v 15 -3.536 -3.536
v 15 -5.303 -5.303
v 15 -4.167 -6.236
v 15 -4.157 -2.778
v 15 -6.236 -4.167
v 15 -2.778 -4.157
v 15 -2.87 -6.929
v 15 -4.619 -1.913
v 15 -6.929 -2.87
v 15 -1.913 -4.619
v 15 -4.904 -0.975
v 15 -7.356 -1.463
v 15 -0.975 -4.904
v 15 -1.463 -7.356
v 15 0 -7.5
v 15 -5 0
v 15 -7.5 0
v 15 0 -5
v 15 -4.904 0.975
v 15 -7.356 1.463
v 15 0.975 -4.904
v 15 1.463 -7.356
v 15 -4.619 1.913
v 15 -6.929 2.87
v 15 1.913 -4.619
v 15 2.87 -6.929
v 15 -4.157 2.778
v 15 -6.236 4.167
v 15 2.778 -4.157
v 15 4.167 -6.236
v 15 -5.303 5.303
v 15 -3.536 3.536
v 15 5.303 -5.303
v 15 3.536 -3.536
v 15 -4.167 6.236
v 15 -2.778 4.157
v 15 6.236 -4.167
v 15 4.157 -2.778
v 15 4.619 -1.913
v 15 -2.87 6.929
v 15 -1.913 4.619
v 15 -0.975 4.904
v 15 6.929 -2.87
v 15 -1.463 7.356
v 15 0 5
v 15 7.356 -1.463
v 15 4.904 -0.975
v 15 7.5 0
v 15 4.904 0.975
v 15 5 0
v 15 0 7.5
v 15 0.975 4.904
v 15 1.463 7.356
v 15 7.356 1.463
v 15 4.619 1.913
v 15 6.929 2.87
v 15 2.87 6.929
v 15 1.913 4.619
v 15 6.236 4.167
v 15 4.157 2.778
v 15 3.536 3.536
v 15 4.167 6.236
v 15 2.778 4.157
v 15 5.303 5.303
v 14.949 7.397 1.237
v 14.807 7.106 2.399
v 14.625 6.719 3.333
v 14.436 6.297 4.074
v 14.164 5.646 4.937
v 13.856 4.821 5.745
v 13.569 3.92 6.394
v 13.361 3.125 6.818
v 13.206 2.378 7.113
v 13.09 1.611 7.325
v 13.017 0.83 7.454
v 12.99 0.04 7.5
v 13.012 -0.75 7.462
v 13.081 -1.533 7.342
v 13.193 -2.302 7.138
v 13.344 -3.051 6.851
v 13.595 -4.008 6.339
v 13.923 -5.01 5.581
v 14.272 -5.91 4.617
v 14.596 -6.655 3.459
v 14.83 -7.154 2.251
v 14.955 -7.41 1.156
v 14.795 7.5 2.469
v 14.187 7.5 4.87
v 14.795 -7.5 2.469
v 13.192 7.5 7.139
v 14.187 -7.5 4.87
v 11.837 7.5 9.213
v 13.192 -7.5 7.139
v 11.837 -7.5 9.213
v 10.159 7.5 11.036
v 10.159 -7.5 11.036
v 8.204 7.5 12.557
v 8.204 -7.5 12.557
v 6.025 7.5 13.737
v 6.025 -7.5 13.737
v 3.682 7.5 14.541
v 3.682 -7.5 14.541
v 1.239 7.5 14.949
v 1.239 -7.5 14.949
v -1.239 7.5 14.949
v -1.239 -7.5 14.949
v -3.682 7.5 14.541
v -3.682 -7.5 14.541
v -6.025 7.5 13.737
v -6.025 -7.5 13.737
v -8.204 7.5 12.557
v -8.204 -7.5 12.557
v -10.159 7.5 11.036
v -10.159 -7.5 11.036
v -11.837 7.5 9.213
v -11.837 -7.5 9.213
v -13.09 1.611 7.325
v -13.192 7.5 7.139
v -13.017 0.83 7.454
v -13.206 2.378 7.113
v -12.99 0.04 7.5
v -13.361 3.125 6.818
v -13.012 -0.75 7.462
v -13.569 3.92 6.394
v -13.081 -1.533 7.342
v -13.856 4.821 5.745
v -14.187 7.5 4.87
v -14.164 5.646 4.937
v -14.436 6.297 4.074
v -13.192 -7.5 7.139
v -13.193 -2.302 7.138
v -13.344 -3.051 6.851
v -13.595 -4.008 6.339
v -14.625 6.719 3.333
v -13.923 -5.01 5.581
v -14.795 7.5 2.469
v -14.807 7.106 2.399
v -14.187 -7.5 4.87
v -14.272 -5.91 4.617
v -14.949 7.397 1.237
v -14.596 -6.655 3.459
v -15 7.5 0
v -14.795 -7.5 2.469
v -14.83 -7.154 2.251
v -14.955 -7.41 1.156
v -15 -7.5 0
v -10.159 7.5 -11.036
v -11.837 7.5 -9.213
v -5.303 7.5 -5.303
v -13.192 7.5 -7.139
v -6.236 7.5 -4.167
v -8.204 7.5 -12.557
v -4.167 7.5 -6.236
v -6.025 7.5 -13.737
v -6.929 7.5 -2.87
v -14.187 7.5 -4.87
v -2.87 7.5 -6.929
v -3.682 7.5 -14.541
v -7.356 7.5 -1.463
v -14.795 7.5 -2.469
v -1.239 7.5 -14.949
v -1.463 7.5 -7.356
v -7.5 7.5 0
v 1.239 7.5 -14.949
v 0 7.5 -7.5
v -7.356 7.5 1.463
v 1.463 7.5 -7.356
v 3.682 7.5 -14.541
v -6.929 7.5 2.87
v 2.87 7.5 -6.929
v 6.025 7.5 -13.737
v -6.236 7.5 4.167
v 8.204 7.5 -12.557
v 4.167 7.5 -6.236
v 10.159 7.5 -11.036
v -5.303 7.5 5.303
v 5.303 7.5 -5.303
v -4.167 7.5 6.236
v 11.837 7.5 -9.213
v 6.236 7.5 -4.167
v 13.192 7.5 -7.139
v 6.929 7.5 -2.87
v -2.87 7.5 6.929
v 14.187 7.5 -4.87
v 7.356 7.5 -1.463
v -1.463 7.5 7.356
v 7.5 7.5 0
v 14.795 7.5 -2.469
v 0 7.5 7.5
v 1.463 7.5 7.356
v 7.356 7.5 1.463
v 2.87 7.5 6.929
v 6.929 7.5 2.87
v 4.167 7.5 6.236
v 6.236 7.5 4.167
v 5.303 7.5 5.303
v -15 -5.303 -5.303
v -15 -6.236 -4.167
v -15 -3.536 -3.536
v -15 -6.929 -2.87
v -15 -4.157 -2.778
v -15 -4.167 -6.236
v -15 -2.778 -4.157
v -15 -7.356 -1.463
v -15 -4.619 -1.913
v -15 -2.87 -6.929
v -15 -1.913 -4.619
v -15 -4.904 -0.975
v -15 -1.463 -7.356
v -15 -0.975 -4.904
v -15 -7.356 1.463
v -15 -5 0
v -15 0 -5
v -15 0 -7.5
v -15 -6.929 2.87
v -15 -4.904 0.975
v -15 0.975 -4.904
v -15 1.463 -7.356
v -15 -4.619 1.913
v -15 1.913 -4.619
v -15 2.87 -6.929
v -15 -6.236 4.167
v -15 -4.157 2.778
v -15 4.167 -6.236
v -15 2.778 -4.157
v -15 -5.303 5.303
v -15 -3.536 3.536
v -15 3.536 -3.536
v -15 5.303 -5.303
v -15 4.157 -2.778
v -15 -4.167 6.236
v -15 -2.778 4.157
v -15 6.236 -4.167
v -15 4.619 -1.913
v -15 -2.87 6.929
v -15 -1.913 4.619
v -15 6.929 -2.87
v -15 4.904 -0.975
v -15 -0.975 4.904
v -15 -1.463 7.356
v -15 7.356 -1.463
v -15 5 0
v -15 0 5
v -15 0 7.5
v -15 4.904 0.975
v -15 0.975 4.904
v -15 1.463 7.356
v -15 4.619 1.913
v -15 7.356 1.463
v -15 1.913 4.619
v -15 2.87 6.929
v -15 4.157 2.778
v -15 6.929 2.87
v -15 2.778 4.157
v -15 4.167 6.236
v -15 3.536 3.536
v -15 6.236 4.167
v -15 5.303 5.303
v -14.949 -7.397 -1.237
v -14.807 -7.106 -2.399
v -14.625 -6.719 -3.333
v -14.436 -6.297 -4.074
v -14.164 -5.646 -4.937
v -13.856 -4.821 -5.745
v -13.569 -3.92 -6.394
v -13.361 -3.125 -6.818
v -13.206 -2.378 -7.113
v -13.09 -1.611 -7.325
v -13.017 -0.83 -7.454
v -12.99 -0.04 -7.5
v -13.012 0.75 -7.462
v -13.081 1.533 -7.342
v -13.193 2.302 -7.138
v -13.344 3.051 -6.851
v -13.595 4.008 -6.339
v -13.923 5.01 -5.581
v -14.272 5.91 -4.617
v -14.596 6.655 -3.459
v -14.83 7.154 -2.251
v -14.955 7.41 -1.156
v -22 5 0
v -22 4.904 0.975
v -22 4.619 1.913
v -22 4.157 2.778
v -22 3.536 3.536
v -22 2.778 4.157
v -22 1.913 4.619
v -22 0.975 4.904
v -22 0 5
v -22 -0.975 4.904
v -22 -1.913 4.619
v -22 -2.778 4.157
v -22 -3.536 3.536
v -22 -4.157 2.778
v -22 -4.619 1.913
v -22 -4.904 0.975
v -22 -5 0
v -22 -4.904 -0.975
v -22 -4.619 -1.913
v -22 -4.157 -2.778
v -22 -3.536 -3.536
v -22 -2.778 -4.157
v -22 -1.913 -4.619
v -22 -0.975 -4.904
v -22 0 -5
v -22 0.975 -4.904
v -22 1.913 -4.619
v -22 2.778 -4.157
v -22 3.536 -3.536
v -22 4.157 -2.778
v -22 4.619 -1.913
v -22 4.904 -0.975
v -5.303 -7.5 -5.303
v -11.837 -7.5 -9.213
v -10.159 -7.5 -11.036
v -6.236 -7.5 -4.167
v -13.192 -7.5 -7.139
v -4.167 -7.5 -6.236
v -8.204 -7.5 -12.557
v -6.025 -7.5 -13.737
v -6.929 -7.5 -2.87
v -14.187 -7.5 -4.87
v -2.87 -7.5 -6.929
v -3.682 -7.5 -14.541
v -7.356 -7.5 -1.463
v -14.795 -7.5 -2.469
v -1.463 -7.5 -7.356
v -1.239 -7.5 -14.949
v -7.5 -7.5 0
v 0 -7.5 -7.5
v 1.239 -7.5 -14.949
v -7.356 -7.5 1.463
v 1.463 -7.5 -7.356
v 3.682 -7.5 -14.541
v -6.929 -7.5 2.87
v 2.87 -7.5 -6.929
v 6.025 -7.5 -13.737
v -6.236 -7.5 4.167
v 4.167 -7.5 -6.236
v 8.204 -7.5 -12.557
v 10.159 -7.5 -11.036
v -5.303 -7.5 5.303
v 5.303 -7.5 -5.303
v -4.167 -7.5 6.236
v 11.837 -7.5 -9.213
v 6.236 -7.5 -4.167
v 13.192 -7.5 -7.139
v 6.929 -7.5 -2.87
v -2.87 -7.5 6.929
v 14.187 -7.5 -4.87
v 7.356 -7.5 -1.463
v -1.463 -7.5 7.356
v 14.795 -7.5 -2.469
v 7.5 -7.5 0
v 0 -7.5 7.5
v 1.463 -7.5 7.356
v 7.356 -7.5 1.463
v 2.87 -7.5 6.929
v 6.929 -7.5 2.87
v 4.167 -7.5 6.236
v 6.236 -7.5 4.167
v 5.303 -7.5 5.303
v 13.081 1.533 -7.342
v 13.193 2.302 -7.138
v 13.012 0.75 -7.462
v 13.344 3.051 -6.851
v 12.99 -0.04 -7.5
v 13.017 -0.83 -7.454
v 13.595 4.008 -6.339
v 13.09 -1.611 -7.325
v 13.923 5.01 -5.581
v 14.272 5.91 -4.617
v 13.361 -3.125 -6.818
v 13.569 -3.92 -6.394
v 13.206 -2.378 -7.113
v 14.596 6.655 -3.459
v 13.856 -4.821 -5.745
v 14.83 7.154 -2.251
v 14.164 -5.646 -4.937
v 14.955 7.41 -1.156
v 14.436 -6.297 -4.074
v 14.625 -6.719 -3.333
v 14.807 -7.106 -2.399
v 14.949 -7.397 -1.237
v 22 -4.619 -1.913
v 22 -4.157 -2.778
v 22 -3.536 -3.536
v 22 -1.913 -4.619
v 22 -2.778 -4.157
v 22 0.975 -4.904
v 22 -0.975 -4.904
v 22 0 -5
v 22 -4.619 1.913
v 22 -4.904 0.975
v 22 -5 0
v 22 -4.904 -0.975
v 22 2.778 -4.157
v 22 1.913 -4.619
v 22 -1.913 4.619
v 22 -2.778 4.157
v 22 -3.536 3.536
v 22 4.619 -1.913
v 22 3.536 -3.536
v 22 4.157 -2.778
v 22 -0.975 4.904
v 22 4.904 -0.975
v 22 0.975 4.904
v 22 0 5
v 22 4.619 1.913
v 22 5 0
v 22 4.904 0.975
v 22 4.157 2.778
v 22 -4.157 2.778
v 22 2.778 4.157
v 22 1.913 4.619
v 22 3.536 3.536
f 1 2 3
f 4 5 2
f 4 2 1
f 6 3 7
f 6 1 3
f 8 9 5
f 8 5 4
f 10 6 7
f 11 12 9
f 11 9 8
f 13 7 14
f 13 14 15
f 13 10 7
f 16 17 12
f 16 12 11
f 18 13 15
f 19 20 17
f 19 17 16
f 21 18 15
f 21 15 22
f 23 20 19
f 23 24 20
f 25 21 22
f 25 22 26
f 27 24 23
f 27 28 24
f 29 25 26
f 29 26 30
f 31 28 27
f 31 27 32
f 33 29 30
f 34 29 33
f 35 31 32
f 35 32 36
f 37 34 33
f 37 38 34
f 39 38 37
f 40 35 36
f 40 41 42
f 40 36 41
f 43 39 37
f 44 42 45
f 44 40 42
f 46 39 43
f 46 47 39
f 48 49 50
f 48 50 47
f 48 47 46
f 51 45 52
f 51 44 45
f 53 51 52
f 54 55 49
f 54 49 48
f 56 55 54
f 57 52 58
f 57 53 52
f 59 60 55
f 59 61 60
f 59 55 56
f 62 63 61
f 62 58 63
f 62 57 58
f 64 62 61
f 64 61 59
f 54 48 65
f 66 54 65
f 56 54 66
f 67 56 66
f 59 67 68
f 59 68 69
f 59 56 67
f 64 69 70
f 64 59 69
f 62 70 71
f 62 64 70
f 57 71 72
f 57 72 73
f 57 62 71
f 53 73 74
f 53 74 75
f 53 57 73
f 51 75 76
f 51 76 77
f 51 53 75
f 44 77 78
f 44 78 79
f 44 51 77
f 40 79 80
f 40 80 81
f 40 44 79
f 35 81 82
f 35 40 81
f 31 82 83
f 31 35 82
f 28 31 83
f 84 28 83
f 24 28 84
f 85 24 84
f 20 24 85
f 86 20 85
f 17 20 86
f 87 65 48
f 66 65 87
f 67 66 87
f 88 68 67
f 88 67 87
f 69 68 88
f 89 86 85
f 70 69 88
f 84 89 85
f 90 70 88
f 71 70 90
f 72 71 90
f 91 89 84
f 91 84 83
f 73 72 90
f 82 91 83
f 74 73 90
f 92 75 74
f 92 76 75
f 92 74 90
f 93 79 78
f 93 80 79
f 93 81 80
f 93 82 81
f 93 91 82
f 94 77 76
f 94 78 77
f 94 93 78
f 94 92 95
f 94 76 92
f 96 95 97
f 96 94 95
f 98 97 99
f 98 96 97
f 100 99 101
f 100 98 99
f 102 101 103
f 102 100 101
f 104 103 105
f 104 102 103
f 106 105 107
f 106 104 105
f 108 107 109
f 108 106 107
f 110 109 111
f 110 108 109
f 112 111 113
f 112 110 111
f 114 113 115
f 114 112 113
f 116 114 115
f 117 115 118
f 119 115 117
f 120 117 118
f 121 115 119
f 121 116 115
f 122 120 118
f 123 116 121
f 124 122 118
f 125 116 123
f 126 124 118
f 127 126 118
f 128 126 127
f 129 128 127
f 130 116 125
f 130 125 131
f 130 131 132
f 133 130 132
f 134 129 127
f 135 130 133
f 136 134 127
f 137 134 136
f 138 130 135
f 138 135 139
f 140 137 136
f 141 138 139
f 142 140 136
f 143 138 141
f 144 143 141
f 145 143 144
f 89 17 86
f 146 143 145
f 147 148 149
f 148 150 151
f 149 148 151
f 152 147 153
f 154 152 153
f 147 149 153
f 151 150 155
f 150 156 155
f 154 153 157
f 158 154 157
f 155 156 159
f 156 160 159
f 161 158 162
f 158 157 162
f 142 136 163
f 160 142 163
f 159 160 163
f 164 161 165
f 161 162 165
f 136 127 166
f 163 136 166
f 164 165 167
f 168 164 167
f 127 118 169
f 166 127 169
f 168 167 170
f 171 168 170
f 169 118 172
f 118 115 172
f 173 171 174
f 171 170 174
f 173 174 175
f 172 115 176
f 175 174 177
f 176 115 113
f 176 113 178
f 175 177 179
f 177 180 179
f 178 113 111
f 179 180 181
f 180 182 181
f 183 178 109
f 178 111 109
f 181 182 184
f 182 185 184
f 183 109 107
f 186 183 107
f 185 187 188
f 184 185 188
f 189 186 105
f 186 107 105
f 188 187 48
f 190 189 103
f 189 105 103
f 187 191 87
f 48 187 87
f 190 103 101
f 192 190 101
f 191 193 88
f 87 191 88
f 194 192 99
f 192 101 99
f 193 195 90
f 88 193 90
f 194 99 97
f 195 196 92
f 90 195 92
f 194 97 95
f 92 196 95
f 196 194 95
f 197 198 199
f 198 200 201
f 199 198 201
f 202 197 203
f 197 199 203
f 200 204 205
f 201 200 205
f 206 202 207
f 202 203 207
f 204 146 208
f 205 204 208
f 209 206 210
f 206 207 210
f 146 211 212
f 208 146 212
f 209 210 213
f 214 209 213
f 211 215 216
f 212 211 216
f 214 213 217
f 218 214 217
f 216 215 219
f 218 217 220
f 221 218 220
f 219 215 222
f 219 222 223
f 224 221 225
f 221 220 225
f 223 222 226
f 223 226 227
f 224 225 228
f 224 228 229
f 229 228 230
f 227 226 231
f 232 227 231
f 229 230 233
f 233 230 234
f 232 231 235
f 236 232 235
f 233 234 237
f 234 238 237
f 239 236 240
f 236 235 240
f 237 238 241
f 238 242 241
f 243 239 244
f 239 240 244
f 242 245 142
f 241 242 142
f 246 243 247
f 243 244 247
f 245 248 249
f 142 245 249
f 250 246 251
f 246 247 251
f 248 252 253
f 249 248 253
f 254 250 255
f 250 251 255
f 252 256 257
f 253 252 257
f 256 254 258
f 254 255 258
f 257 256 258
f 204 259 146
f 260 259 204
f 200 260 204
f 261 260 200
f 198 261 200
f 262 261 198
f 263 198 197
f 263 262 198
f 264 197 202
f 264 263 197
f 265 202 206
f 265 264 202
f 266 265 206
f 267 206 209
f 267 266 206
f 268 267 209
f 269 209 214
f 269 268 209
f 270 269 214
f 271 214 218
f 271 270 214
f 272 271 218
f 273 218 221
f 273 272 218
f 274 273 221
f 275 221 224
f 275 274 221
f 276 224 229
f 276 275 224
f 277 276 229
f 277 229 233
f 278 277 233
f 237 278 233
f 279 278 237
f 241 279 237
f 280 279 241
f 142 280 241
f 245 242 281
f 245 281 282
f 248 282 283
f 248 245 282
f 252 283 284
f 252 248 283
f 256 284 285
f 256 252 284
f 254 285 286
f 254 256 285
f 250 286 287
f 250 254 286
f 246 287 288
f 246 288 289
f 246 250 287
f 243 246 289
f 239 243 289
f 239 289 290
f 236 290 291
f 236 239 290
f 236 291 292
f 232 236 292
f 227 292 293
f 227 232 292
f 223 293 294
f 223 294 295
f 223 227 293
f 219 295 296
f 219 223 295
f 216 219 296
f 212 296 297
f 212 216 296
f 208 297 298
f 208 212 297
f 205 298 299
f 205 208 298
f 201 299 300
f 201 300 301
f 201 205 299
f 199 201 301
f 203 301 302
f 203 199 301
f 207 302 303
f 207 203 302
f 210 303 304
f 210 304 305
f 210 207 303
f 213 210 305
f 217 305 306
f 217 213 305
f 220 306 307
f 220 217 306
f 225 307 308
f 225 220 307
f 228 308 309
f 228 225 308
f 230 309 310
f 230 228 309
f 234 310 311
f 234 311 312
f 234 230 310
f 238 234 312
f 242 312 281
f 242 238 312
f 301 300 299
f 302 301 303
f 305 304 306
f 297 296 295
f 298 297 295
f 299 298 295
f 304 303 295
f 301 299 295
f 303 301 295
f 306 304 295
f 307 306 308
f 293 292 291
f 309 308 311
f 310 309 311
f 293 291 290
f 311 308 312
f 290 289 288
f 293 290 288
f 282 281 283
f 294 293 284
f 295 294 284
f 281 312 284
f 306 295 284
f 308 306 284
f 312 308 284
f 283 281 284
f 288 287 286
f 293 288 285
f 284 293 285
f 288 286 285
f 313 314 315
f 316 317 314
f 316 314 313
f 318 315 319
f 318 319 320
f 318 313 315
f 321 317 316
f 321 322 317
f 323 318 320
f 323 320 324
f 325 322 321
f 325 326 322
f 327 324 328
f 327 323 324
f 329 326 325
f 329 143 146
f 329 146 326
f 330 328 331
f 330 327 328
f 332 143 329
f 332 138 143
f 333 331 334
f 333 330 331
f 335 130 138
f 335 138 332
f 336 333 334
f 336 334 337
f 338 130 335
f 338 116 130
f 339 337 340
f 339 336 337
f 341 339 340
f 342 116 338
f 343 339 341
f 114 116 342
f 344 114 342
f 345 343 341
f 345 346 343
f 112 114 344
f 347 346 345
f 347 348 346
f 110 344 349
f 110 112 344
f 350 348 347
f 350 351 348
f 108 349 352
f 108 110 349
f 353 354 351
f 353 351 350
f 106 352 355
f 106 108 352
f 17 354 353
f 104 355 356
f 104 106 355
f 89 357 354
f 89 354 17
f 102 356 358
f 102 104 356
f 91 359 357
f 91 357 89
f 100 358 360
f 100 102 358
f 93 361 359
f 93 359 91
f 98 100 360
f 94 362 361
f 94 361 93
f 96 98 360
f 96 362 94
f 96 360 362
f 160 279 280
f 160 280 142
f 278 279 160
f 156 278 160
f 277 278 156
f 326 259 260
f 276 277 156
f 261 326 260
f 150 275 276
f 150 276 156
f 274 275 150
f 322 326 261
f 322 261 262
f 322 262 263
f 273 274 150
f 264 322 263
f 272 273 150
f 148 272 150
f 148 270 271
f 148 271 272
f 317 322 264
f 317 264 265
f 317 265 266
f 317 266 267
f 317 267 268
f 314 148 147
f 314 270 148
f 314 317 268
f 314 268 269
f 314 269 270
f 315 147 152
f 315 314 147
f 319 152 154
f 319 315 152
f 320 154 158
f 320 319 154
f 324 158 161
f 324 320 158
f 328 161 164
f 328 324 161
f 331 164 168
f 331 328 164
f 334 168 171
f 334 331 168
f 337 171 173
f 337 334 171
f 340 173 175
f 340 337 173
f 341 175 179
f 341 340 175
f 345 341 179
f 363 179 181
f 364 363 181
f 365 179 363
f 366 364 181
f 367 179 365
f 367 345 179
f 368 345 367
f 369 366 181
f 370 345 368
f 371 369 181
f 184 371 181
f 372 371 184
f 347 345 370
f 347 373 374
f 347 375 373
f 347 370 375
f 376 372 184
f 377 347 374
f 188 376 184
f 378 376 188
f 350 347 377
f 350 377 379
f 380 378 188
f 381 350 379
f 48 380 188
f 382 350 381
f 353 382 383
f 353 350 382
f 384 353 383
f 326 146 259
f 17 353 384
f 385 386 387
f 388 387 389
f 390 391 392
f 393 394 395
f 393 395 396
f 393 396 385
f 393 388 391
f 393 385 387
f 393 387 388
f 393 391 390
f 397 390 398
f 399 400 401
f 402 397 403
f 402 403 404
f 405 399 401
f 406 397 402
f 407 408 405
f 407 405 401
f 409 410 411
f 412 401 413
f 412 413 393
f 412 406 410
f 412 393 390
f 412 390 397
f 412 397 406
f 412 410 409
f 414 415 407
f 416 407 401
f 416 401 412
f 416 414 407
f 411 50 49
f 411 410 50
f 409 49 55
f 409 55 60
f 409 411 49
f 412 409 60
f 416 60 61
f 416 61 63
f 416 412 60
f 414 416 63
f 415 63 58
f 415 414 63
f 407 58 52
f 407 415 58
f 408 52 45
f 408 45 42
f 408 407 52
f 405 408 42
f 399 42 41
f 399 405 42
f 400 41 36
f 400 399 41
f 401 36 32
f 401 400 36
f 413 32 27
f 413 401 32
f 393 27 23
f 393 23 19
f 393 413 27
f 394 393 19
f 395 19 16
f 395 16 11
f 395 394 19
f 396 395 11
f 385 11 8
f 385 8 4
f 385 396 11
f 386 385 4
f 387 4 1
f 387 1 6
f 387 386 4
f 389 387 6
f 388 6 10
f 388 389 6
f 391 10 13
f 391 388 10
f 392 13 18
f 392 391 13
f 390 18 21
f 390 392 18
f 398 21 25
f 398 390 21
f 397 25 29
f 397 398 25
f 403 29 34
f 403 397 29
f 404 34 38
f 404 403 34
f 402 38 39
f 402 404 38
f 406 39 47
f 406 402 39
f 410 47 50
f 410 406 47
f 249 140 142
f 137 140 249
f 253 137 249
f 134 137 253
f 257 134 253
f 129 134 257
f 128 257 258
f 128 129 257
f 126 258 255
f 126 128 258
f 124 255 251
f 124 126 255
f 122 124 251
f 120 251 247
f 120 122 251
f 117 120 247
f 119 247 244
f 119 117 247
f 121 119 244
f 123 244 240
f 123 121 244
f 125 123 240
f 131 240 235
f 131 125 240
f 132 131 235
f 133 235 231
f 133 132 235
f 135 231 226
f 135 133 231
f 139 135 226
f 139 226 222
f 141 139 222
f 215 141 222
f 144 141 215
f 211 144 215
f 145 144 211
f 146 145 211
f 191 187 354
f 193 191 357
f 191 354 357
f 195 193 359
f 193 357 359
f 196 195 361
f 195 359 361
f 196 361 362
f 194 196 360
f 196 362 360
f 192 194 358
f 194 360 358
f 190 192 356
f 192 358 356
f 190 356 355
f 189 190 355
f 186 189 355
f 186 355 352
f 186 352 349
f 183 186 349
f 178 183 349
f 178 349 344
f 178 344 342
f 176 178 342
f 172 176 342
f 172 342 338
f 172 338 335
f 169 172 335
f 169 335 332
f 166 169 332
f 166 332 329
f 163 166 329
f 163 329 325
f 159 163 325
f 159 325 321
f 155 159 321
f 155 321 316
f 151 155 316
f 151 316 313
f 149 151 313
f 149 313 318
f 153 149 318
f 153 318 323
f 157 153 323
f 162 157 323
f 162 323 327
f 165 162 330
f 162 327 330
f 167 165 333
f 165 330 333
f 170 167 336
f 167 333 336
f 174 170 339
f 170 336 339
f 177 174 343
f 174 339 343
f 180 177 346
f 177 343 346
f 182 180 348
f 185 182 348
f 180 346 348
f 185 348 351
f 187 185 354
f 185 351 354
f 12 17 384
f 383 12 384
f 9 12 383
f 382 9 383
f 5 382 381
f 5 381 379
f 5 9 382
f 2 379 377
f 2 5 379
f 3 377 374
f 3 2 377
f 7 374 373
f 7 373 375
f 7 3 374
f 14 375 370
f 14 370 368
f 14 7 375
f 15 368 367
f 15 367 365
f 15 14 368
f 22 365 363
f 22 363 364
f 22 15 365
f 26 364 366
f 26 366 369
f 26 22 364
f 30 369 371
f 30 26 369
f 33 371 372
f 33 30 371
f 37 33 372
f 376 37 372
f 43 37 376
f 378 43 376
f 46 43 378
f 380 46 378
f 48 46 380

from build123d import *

# Parameters (mm, degrees)
F0_R     = 15
F1_DEPTH = 7.5
F2_R     = 7.5
F3_DEPTH = 15
F4_R     = 5
F5_DEPTH = 22
F6_R     = 7.5
F7_DEPTH = 15.0010001


with BuildPart() as f1:
    # F0 (on Front) → F1 (new body, symmetric)
    with BuildSketch(Plane.XZ):
        Circle(F0_R)
    extrude(amount=F1_DEPTH, both=True)

    # F2 (on Right) → F3 (join, symmetric)
    with BuildSketch(Plane.YZ):
        Circle(F2_R)
    extrude(amount=F3_DEPTH, both=True)

    # F4 (on Right) → F5 (join, symmetric)
    with BuildSketch(Plane.YZ):
        Circle(F4_R)
    extrude(amount=F5_DEPTH, both=True)

    # F6 (on face) → F7 (cut, through all)
    with BuildSketch(Plane.XZ.offset(7.5)):
        Circle(F6_R)
    extrude(amount=-F7_DEPTH, mode=Mode.SUBTRACT)


solid = f1.part
